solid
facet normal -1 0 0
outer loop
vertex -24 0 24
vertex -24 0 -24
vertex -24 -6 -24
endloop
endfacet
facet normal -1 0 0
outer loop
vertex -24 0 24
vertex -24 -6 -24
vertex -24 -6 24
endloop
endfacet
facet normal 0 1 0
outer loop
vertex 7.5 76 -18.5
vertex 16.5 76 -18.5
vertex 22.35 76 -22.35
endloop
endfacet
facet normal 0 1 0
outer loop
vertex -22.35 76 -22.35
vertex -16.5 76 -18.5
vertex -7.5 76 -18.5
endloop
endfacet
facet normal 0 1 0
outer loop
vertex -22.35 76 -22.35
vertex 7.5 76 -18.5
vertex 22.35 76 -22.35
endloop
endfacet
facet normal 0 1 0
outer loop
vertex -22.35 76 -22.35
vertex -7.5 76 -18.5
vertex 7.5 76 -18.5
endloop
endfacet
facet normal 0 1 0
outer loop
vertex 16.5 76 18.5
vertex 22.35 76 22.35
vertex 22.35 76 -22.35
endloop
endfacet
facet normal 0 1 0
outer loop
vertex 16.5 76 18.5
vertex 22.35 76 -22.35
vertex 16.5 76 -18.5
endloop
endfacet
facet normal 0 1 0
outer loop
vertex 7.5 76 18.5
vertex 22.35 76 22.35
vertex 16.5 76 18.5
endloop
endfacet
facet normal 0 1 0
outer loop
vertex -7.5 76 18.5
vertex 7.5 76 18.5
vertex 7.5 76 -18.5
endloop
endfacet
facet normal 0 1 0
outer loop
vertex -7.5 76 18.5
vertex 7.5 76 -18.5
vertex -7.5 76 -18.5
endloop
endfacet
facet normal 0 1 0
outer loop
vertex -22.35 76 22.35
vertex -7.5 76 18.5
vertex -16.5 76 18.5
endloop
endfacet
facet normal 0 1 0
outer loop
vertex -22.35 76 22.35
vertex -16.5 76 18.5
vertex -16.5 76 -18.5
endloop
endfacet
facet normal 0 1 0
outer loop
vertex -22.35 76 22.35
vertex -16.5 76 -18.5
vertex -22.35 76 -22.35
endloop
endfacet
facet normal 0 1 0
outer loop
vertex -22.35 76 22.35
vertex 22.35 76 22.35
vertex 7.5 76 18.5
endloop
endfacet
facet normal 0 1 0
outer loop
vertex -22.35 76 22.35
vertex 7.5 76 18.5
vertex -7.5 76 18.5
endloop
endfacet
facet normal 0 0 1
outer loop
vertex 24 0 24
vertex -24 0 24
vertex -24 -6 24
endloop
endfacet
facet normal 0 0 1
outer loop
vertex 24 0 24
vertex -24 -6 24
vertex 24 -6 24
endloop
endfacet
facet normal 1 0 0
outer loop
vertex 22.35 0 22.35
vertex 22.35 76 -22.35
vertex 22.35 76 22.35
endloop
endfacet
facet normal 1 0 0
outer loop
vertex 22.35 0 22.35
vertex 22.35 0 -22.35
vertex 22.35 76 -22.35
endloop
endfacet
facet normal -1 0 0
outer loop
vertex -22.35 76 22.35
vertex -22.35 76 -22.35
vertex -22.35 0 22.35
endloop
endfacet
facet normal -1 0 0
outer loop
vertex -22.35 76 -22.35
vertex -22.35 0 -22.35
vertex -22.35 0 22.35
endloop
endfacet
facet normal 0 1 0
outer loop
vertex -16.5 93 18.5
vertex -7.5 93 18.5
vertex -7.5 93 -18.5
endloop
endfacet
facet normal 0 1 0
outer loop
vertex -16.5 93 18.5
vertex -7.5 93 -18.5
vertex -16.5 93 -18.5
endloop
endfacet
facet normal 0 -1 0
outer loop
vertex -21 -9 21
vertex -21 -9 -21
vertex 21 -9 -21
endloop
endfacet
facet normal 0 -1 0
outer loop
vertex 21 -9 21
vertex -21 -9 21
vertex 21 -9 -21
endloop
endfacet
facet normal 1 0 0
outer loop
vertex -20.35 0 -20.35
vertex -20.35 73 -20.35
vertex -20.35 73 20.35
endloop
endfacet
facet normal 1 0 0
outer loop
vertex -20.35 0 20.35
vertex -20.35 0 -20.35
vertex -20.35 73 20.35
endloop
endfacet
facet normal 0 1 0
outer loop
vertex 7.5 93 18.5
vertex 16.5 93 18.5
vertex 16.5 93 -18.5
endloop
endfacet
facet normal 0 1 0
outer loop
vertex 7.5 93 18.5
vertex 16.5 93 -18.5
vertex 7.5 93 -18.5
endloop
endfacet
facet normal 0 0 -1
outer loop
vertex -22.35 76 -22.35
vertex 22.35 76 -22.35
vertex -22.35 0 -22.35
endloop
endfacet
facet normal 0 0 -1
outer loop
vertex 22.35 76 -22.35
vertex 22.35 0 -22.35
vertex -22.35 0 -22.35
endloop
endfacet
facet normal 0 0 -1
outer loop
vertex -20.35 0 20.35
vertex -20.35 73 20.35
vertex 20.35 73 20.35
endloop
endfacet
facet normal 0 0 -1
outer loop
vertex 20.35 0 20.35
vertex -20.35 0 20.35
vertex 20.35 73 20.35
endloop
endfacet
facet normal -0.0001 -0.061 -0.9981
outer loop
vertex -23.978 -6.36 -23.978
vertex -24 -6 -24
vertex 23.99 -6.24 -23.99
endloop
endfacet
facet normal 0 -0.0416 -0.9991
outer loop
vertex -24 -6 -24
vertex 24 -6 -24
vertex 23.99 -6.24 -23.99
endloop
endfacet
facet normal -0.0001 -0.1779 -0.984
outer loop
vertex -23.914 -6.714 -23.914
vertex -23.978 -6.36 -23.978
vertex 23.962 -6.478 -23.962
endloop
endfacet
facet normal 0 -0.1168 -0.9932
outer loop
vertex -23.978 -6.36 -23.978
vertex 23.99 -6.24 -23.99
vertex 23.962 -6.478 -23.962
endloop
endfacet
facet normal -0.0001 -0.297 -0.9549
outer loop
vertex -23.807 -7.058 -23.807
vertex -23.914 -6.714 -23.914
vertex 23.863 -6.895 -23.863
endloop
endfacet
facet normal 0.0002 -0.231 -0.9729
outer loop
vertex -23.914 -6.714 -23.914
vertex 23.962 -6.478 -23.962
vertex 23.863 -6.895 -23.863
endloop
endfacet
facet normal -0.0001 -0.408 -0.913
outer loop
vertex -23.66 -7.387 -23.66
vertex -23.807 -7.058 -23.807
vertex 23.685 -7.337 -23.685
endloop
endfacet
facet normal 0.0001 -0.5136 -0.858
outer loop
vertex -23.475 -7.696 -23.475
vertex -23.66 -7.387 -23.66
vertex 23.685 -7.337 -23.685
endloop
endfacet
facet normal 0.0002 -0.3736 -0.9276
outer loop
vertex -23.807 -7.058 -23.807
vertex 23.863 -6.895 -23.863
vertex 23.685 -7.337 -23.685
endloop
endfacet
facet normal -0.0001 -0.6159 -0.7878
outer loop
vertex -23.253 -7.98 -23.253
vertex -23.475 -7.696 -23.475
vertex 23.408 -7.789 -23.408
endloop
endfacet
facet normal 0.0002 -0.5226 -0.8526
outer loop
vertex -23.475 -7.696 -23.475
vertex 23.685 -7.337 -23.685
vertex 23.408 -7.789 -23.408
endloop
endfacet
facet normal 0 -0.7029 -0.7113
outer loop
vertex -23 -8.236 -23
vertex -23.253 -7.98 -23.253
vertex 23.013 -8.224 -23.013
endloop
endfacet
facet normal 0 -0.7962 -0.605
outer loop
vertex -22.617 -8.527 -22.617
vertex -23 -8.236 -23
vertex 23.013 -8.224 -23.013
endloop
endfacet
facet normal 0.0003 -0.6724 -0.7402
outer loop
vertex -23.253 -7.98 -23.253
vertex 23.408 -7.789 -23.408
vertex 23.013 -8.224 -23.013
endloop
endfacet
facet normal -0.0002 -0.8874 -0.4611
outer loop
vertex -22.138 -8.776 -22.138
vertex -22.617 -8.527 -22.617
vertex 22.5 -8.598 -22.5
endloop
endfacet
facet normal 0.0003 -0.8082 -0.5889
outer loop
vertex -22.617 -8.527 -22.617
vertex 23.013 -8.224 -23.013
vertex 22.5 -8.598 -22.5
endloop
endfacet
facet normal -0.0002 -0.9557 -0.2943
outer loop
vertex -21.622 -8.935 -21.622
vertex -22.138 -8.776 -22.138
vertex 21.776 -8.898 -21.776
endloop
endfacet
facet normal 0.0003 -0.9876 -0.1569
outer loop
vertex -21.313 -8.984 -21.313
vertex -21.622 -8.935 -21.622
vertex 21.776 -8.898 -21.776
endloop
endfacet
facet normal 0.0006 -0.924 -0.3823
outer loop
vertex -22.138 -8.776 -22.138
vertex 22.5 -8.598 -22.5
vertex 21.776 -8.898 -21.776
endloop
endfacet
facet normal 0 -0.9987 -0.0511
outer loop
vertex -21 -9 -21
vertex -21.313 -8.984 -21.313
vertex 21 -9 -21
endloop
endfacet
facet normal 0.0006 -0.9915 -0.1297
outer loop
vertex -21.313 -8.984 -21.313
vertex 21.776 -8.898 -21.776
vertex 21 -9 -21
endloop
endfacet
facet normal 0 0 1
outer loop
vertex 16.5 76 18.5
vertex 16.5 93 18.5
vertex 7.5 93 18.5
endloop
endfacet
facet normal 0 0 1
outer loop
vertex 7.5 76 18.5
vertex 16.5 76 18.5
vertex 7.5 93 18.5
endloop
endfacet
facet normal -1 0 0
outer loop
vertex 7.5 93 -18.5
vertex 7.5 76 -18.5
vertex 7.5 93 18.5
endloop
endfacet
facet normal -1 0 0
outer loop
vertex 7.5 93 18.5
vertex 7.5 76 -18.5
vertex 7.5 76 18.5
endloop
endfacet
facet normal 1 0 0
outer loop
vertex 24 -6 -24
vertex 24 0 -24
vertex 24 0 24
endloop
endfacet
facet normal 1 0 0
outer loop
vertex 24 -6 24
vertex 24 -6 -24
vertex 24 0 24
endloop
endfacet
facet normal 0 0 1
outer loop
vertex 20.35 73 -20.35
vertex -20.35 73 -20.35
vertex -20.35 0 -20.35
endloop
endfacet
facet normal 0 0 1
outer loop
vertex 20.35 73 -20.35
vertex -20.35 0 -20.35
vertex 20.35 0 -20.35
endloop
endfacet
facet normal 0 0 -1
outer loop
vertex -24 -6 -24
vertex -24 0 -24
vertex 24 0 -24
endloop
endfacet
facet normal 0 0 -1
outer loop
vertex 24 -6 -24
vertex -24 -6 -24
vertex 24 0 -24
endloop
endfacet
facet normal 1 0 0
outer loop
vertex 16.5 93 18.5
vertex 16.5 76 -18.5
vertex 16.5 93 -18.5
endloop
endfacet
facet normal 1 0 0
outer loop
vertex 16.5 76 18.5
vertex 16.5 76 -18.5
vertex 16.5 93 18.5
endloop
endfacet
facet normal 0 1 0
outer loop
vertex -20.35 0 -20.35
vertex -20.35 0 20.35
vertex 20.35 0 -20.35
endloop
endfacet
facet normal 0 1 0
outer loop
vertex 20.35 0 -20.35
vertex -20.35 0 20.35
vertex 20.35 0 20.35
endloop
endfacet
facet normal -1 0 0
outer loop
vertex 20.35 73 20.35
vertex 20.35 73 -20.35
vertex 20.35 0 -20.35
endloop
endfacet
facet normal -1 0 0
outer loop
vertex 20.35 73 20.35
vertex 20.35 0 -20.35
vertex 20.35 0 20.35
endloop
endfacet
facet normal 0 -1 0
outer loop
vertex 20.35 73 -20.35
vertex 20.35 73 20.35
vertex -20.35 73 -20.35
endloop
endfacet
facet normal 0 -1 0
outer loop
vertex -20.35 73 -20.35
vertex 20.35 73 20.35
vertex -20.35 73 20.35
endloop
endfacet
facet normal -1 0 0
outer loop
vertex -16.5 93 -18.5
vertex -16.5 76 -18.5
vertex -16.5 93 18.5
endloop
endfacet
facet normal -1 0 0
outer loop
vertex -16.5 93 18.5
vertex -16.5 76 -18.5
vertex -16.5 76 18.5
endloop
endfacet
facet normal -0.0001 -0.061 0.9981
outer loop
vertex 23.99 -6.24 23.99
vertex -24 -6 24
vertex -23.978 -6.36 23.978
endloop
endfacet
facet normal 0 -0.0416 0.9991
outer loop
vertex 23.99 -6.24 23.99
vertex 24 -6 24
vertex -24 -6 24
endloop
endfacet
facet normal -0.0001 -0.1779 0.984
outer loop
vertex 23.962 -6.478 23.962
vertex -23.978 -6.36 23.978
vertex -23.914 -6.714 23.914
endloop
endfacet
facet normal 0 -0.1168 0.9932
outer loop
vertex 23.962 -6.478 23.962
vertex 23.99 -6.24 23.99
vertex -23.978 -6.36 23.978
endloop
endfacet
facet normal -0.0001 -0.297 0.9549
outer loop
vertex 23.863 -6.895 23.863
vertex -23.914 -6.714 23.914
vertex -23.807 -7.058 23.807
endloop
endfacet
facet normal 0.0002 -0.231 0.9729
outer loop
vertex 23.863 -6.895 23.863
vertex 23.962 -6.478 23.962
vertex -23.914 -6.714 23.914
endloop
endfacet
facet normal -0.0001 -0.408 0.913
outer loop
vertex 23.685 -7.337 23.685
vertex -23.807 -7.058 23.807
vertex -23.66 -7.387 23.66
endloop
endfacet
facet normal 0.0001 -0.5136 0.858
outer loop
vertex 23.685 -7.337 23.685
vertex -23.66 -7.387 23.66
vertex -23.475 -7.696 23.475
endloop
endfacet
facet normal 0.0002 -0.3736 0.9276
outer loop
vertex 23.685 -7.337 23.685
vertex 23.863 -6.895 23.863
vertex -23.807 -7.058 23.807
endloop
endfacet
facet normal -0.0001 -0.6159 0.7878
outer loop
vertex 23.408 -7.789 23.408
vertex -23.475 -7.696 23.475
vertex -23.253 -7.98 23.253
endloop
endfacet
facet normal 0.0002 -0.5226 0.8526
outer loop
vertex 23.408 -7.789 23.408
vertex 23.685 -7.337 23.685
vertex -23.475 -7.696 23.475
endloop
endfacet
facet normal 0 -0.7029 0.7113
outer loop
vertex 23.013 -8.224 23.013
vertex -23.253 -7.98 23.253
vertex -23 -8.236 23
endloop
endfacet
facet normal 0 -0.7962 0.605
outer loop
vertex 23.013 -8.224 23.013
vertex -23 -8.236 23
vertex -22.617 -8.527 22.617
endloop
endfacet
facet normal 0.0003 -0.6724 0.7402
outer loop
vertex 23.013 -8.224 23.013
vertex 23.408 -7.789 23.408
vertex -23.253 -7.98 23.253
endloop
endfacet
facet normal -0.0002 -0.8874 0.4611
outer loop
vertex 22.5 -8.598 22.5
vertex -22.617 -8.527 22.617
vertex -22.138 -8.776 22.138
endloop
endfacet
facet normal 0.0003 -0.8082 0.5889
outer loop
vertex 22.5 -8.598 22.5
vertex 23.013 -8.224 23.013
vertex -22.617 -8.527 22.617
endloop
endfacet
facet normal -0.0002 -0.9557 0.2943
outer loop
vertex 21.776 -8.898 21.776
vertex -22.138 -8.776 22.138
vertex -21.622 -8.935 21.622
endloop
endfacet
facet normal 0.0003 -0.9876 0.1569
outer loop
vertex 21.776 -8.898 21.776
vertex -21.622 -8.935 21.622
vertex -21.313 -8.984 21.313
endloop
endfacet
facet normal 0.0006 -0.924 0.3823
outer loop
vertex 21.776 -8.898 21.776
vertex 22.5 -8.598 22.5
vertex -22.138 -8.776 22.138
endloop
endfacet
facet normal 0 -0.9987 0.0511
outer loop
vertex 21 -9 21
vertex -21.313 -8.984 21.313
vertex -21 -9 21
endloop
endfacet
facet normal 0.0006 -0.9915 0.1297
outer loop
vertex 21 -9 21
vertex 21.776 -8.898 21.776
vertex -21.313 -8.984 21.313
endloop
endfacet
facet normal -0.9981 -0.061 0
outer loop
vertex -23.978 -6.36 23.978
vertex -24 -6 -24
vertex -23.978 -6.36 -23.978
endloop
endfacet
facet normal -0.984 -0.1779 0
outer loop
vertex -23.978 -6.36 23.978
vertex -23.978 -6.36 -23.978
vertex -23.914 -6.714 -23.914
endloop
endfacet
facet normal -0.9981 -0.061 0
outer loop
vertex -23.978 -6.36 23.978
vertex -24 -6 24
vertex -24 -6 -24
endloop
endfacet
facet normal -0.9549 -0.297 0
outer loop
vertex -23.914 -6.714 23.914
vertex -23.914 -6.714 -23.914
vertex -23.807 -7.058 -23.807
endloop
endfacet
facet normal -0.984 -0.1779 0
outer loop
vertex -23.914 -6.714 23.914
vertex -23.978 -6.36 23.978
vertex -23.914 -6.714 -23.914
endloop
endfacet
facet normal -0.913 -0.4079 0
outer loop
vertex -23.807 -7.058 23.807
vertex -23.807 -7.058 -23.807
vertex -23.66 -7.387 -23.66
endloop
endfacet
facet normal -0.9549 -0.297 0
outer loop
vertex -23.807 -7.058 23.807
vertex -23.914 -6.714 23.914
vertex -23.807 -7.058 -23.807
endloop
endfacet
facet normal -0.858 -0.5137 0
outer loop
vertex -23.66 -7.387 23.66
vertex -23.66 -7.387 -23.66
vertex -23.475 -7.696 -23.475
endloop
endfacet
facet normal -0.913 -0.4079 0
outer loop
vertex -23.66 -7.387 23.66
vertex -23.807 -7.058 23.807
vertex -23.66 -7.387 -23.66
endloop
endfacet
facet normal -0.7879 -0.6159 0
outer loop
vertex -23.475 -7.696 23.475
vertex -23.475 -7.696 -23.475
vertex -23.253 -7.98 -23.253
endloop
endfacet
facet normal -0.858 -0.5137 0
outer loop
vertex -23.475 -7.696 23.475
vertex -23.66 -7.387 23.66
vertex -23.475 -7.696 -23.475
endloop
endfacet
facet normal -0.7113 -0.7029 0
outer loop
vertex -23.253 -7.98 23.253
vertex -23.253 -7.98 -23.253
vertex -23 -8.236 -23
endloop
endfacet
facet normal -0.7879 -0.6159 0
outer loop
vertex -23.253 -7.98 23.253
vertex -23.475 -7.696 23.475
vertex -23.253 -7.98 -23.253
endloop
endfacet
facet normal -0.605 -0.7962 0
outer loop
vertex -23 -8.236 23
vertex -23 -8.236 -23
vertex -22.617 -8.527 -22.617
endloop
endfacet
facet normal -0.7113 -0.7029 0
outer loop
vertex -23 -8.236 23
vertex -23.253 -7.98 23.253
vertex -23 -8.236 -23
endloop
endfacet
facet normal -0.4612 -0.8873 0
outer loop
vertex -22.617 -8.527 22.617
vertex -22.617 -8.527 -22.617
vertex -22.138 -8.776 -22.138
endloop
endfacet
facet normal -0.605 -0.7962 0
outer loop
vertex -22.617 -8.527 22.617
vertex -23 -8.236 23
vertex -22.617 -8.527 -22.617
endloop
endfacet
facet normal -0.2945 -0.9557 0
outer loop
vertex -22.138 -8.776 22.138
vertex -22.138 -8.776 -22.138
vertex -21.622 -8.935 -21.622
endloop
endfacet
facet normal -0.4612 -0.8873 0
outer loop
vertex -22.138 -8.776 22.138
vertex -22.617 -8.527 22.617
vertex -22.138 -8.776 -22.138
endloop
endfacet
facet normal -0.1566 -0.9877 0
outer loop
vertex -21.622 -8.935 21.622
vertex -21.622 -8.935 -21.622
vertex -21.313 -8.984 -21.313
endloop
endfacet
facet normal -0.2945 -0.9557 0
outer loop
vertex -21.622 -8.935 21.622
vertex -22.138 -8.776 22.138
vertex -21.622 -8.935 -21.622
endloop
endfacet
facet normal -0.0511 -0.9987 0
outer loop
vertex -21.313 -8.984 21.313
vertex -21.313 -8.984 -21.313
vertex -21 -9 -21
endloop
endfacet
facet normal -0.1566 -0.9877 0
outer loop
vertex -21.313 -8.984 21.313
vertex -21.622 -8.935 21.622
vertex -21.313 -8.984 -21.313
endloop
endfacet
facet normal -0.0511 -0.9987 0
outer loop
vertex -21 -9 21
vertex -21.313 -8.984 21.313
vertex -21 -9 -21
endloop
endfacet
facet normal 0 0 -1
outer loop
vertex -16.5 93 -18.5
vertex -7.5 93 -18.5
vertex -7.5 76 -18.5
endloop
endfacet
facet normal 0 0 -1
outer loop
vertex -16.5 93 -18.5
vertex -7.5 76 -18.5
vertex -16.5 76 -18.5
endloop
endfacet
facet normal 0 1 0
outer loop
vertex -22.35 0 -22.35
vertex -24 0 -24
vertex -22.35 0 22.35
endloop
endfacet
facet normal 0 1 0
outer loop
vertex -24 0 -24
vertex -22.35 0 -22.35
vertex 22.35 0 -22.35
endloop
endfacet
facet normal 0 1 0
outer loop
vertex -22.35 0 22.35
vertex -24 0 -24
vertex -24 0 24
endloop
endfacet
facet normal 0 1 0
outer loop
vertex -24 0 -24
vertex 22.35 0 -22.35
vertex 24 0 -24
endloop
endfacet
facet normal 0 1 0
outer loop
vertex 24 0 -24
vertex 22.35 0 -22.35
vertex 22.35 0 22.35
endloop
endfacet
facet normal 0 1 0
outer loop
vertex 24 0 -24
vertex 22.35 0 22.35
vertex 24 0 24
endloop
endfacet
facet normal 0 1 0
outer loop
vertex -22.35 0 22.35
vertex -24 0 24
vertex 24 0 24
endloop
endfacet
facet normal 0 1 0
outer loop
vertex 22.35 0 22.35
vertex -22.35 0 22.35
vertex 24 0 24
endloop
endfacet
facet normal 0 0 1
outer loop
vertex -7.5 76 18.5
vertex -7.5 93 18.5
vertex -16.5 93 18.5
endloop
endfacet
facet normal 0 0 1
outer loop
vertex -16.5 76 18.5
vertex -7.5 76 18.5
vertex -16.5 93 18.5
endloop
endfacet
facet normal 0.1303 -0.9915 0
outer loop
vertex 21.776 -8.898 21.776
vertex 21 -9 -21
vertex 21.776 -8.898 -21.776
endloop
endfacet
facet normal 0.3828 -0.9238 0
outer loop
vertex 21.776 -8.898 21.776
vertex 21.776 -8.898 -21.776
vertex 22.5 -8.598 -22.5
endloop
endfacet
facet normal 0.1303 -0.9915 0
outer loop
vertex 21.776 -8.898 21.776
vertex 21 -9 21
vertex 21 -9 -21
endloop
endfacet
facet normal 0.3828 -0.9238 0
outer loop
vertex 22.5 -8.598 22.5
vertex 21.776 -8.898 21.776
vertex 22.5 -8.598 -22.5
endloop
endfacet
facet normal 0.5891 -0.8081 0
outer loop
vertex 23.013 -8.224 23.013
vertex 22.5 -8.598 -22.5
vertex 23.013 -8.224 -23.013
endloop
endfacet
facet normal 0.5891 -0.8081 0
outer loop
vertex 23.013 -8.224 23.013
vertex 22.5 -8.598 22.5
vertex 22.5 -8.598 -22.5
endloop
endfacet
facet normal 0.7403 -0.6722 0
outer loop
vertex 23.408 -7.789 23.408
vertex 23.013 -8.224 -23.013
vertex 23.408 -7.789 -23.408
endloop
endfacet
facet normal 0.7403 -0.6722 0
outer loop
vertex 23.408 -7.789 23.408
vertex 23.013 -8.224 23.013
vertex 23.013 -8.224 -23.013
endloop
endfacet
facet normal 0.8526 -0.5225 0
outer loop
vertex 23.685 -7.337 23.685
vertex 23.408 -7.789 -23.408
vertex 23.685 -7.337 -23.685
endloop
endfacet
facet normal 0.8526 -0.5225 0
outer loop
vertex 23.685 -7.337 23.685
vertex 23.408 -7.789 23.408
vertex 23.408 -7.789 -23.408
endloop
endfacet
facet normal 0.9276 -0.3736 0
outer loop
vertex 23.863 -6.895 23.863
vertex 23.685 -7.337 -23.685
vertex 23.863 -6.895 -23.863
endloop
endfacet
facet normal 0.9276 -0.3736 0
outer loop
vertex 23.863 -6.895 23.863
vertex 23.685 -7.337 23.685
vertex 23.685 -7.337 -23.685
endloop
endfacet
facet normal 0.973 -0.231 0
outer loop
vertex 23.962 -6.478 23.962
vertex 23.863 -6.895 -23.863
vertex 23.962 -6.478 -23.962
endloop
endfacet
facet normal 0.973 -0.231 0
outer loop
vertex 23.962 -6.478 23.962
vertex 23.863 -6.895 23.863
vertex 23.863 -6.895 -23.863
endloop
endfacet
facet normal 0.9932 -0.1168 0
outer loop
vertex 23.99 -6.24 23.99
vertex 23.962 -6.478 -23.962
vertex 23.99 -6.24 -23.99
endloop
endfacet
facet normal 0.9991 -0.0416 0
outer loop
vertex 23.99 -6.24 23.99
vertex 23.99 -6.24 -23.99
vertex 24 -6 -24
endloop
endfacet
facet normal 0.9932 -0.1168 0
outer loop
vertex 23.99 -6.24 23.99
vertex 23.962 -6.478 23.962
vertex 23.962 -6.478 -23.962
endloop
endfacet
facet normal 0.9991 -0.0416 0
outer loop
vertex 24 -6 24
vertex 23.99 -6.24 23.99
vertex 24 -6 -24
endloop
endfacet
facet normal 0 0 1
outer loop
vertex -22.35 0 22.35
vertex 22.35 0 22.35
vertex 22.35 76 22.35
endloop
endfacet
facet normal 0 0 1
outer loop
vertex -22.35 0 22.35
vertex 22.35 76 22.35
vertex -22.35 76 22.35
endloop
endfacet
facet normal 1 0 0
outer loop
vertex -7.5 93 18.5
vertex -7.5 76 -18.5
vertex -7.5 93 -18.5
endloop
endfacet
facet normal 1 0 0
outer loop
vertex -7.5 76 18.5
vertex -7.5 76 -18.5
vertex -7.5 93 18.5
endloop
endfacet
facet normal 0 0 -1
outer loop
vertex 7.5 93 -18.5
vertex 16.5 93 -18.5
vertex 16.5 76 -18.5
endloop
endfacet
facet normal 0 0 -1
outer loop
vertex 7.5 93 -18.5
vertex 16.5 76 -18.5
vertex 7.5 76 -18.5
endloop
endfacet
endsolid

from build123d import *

# Parameters (mm, degrees)
F0_W     = 44.7
F0_H     = 44.7
F0_W_2   = 40.7
F0_H_2   = 40.7
F1_DEPTH = 73
F2_W     = 44.7
F2_H     = 44.7
F2_W_2   = 40.7
F2_H_2   = 40.7
F2_W_3   = 9
F2_H_3   = 37
F3_DEPTH = 3
F4_DEPTH = 20
F0_W_3   = 48
F0_H_3   = 48
F5_DEPTH = 9
F6_R     = 3


with BuildPart() as f1:
    # F0 (on Front) → F1 (new body)
    with BuildSketch(Plane.XZ):
        Rectangle(F0_W, F0_H)
        Rectangle(F0_W_2, F0_H_2, mode=Mode.SUBTRACT)
    extrude(amount=-F1_DEPTH)

    # F2 (on face) → F3 (join)
    with BuildSketch(Plane(origin=(0, 73, 0), x_dir=(-1, 0, 0), z_dir=(0, 1, 0))):
        Rectangle(F2_W, F2_H)
        Rectangle(F2_W_2, F2_H_2, mode=Mode.SUBTRACT)
        Rectangle(F2_W_2, F2_H_2)
        with Locations((-12, 0)):
            Rectangle(F2_W_3, F2_H_3, mode=Mode.SUBTRACT)
        with Locations((12, 0)):
            Rectangle(F2_W_3, F2_H_3, mode=Mode.SUBTRACT)
    extrude(amount=F3_DEPTH)

    # F2 (on face) → F4 (join)
    with BuildSketch(Plane(origin=(0, 73, 0), x_dir=(-1, 0, 0), z_dir=(0, 1, 0))):
        with Locations((-12, 0)):
            Rectangle(F2_W_3, F2_H_3)
        with Locations((12, 0)):
            Rectangle(F2_W_3, F2_H_3)
    extrude(amount=F4_DEPTH)

    # F0 (on Front) → F5 (join)
    with BuildSketch(Plane.XZ):
        Rectangle(F0_W_3, F0_H_3)
        Rectangle(F0_W, F0_H, mode=Mode.SUBTRACT)
        Rectangle(F0_W, F0_H)
        Rectangle(F0_W_2, F0_H_2, mode=Mode.SUBTRACT)
        Rectangle(F0_W_2, F0_H_2)
    extrude(amount=F5_DEPTH)

    # F6
    f6_edges = [f1.edges().sort_by_distance(p)[0] for p in [
        (24, -9, 0),
        (0, -9, 24),
        (-24, -9, 0),
        (0, -9, -24),
    ]]
    fillet(f6_edges, radius=F6_R)


solid = f1.part
